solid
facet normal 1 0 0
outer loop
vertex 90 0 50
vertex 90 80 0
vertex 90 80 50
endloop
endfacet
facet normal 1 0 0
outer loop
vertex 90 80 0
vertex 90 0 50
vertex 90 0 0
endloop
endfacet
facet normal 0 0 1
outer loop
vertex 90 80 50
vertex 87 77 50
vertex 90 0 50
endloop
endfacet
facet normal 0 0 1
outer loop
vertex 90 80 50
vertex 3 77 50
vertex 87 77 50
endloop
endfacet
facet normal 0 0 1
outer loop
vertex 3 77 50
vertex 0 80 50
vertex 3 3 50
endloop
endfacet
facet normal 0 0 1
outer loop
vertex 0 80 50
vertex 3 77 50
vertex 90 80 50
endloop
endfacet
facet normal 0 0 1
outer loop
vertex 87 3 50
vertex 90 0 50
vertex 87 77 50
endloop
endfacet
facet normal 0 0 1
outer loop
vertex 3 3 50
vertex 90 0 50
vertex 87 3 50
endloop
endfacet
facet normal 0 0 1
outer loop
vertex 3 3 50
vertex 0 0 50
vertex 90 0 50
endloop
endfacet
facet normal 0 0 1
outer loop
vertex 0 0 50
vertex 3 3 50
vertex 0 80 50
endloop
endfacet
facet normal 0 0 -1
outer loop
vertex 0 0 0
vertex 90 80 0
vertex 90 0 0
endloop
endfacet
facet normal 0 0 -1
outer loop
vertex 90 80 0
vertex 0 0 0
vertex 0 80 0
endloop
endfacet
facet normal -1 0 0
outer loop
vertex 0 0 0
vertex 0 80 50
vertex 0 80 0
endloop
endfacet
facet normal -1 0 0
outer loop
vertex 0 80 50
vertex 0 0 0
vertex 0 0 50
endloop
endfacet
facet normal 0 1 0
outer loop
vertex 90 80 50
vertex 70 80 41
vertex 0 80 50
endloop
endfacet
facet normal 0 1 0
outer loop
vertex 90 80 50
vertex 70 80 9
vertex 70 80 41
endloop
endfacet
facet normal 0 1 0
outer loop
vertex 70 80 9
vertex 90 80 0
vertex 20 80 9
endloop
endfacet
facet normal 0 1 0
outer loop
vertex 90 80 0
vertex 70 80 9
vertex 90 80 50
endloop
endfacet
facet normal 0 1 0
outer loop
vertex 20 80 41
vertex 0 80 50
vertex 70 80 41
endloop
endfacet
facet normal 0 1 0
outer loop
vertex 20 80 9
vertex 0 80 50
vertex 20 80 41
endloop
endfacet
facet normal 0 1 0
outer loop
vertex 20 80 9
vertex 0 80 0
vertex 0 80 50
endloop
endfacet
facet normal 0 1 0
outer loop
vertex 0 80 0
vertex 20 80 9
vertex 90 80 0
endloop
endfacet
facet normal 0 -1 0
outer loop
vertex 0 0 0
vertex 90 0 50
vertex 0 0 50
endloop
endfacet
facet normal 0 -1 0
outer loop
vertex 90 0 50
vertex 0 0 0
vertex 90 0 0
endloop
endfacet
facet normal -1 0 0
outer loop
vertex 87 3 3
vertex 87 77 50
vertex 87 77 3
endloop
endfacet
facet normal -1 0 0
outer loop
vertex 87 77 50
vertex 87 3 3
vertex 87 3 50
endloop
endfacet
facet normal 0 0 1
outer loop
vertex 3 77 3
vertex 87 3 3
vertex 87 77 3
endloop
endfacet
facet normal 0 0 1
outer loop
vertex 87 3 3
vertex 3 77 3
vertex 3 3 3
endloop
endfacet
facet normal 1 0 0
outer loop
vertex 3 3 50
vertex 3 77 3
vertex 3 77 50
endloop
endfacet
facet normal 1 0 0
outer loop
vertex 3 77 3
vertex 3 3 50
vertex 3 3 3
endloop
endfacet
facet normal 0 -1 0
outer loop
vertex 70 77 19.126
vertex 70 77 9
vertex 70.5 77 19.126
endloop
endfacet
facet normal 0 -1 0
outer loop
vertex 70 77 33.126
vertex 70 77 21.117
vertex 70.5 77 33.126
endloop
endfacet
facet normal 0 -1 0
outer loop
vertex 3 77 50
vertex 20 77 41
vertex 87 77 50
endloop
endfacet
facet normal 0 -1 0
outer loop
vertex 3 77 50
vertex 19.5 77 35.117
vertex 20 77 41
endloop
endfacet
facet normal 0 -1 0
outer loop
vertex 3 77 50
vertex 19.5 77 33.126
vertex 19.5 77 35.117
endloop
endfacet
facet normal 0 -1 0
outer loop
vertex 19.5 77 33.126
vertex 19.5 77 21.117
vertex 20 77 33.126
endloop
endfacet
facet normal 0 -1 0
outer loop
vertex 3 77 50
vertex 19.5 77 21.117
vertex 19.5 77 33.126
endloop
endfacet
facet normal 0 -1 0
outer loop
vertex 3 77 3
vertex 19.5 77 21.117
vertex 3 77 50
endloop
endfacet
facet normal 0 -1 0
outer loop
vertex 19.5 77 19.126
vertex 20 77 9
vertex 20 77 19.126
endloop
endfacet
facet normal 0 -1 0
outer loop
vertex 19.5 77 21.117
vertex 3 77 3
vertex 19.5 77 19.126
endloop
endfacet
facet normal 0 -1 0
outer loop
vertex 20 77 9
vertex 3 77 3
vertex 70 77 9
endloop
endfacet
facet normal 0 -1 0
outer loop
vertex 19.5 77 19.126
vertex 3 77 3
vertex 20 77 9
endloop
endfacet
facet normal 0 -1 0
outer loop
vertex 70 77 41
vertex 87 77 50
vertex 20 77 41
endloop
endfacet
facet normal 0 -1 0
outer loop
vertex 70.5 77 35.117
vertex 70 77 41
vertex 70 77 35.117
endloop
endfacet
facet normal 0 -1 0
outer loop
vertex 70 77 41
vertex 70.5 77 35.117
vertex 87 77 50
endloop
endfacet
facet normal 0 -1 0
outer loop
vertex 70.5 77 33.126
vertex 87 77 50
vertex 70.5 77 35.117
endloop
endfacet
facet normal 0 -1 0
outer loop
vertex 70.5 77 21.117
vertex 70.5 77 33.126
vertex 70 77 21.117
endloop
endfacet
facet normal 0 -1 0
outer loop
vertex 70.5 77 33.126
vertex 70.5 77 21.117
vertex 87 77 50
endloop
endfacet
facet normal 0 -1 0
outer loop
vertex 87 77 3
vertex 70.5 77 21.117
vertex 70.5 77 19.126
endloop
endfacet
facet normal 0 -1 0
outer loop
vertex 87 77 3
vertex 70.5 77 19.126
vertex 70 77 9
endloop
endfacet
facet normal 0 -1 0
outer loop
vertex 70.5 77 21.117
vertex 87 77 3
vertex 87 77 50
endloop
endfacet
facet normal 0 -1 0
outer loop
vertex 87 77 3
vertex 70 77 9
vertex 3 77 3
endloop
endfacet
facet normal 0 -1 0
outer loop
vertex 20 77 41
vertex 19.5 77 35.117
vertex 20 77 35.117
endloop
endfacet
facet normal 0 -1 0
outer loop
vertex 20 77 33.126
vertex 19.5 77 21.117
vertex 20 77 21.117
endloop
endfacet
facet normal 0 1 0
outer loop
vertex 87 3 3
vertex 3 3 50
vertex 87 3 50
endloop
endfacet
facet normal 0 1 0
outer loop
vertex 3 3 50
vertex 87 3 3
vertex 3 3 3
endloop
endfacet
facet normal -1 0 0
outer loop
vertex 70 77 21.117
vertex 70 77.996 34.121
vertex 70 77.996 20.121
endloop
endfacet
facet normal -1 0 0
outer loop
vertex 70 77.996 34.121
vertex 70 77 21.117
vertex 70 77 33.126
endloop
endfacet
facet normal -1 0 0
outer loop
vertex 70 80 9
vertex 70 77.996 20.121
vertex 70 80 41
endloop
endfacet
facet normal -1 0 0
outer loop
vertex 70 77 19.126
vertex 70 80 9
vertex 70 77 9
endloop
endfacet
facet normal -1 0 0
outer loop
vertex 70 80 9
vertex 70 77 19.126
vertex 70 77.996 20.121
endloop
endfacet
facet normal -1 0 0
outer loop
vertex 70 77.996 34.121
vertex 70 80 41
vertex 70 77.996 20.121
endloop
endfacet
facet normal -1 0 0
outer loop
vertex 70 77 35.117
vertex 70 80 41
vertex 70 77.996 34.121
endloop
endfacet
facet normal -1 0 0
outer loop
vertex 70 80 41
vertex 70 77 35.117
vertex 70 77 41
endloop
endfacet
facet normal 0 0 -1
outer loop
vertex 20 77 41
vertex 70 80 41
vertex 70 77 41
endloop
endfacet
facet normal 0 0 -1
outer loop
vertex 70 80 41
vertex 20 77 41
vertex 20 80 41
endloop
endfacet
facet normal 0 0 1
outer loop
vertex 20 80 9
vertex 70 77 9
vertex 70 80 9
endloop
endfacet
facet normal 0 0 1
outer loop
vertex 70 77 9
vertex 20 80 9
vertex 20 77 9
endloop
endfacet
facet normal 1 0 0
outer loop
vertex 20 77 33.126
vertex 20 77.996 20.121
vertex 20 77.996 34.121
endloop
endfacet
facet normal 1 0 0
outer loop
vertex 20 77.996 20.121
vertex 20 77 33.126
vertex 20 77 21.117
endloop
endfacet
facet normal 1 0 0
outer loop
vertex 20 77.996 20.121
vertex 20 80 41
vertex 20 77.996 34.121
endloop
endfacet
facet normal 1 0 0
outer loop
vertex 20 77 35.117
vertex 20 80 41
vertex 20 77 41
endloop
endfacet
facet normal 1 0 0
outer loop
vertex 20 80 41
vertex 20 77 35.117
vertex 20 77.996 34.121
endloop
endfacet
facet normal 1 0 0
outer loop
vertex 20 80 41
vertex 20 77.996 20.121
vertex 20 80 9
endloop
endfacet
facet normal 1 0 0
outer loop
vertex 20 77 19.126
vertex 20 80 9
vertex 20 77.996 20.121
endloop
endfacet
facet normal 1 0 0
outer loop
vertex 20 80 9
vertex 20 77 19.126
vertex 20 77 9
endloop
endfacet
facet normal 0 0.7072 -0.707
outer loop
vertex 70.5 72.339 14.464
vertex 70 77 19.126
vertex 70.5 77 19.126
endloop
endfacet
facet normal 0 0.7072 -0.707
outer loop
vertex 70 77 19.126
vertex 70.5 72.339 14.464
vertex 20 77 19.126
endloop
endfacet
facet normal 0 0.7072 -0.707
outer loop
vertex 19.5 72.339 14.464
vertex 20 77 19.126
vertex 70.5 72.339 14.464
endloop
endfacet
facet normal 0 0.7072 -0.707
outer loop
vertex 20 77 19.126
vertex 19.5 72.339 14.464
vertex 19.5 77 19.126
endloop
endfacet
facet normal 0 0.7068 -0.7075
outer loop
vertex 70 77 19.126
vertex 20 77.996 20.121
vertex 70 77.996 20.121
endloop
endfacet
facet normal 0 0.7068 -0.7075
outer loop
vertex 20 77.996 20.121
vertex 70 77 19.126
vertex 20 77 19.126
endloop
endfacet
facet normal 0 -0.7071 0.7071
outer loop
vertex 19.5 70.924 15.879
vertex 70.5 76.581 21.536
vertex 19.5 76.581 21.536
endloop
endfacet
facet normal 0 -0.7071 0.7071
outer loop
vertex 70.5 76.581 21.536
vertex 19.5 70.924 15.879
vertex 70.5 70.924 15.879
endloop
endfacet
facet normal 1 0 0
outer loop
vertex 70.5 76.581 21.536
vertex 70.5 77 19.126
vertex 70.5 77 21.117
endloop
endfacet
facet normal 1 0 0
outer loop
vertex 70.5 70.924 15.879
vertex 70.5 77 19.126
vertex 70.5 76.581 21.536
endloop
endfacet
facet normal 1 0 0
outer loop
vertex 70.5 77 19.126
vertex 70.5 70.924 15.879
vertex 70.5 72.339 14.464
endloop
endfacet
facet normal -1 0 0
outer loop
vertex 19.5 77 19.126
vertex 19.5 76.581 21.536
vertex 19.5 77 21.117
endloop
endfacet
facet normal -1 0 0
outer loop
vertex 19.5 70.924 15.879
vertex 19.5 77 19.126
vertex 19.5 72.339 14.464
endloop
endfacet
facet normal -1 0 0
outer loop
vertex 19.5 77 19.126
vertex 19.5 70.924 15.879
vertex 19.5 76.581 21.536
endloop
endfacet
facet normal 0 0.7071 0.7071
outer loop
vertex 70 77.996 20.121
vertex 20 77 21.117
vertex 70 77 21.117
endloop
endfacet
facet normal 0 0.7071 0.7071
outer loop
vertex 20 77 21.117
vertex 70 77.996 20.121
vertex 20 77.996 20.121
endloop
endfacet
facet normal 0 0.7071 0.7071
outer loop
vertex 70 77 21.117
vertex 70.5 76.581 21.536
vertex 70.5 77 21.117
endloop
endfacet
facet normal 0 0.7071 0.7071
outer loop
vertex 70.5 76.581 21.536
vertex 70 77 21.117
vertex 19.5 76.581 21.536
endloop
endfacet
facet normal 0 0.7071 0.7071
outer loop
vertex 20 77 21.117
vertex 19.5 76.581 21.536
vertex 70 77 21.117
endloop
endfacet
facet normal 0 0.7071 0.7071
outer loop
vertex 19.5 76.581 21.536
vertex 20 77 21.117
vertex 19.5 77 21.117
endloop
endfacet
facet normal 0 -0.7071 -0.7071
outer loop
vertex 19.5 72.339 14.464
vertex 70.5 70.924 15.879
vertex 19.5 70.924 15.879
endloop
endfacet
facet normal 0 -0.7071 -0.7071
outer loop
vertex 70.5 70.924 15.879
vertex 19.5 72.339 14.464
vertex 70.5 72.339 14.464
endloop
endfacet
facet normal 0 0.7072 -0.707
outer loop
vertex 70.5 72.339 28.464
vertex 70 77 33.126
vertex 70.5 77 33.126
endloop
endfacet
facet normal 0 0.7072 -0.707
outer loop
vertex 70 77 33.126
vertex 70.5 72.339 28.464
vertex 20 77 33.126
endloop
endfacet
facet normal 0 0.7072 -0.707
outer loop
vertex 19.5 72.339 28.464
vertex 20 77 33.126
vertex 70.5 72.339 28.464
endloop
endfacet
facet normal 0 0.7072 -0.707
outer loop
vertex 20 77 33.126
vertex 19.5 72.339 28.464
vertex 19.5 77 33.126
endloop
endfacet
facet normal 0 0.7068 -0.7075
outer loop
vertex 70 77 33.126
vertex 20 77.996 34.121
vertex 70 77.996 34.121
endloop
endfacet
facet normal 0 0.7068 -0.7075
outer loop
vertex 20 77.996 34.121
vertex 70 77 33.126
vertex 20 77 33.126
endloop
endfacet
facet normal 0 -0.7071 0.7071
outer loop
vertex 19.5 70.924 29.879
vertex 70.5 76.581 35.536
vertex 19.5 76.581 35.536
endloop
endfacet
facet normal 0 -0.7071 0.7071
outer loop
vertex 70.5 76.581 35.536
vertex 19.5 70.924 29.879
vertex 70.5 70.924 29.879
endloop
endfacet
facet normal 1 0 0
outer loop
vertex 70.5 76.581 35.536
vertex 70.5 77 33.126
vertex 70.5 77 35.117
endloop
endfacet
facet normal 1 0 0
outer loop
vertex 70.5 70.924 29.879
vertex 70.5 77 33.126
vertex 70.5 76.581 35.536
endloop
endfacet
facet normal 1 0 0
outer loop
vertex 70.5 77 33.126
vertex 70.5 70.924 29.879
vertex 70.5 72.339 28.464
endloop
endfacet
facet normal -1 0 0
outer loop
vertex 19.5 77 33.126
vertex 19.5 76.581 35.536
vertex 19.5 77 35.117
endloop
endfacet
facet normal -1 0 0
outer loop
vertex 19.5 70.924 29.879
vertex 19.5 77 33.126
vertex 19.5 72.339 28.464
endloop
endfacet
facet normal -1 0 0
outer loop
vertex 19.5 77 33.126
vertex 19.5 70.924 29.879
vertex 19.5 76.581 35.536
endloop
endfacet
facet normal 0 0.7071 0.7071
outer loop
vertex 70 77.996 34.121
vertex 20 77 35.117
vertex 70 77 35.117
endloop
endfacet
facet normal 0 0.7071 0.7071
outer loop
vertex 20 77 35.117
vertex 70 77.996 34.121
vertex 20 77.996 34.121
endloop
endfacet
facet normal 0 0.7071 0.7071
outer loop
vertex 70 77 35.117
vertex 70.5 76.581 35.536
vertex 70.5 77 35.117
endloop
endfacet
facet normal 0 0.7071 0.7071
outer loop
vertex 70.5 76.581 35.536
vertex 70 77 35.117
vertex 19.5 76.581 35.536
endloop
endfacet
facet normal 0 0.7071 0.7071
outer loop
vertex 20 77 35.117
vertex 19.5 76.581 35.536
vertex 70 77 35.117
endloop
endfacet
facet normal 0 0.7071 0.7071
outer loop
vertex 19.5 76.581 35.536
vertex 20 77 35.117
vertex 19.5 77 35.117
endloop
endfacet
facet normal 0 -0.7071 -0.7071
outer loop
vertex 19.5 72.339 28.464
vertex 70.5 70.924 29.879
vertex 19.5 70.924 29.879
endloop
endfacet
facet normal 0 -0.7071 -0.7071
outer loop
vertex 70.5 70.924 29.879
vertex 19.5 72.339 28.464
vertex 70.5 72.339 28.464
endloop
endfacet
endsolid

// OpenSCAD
$fn = 32;

// ----------------------------------------------------------------------
// Vent box: louvers enclosure
// ----------------------------------------------------------------------

// --- parameters (mm) ---
box_l = 90;               // box length, X
box_w = 80;               // box width, Y
box_h = 50;               // box height, Z
wall_t = 3;               // shell wall thickness
win_l = 50;               // vent window width, X
win_h = 32;               // vent window height, Z
slat_t = 2;               // louver slat thickness
slat_d = 8;               // louver slat depth
slat_a = 45;              // louver slat angle, degrees
slat_pitch = 14;          // louver pitch
slat_yc = 74.46;          // slat centreline Y

win_z0 = (box_h - win_h) / 2;  // window lower edge Z
n_slats = 2;  // louver count
slat_z0 = win_z0 + (win_h - (n_slats - 1) * slat_pitch) / 2;

difference() {
  union() {
    difference() {
      cube([box_l, box_w, box_h]);
  translate([wall_t, wall_t, wall_t])
    cube([box_l - 2 * wall_t, box_w - 2 * wall_t, box_h]);
  translate([(box_l - win_l) / 2, box_w - wall_t - 1, win_z0])
    cube([win_l, wall_t + 2, win_h]);
    }
    for (i = [0 : n_slats - 1])
      translate([box_l / 2, slat_yc, slat_z0 + i * slat_pitch])
        rotate([slat_a, 0, 0])
          cube([win_l + 1, slat_d, slat_t], center = true);
  }
}
